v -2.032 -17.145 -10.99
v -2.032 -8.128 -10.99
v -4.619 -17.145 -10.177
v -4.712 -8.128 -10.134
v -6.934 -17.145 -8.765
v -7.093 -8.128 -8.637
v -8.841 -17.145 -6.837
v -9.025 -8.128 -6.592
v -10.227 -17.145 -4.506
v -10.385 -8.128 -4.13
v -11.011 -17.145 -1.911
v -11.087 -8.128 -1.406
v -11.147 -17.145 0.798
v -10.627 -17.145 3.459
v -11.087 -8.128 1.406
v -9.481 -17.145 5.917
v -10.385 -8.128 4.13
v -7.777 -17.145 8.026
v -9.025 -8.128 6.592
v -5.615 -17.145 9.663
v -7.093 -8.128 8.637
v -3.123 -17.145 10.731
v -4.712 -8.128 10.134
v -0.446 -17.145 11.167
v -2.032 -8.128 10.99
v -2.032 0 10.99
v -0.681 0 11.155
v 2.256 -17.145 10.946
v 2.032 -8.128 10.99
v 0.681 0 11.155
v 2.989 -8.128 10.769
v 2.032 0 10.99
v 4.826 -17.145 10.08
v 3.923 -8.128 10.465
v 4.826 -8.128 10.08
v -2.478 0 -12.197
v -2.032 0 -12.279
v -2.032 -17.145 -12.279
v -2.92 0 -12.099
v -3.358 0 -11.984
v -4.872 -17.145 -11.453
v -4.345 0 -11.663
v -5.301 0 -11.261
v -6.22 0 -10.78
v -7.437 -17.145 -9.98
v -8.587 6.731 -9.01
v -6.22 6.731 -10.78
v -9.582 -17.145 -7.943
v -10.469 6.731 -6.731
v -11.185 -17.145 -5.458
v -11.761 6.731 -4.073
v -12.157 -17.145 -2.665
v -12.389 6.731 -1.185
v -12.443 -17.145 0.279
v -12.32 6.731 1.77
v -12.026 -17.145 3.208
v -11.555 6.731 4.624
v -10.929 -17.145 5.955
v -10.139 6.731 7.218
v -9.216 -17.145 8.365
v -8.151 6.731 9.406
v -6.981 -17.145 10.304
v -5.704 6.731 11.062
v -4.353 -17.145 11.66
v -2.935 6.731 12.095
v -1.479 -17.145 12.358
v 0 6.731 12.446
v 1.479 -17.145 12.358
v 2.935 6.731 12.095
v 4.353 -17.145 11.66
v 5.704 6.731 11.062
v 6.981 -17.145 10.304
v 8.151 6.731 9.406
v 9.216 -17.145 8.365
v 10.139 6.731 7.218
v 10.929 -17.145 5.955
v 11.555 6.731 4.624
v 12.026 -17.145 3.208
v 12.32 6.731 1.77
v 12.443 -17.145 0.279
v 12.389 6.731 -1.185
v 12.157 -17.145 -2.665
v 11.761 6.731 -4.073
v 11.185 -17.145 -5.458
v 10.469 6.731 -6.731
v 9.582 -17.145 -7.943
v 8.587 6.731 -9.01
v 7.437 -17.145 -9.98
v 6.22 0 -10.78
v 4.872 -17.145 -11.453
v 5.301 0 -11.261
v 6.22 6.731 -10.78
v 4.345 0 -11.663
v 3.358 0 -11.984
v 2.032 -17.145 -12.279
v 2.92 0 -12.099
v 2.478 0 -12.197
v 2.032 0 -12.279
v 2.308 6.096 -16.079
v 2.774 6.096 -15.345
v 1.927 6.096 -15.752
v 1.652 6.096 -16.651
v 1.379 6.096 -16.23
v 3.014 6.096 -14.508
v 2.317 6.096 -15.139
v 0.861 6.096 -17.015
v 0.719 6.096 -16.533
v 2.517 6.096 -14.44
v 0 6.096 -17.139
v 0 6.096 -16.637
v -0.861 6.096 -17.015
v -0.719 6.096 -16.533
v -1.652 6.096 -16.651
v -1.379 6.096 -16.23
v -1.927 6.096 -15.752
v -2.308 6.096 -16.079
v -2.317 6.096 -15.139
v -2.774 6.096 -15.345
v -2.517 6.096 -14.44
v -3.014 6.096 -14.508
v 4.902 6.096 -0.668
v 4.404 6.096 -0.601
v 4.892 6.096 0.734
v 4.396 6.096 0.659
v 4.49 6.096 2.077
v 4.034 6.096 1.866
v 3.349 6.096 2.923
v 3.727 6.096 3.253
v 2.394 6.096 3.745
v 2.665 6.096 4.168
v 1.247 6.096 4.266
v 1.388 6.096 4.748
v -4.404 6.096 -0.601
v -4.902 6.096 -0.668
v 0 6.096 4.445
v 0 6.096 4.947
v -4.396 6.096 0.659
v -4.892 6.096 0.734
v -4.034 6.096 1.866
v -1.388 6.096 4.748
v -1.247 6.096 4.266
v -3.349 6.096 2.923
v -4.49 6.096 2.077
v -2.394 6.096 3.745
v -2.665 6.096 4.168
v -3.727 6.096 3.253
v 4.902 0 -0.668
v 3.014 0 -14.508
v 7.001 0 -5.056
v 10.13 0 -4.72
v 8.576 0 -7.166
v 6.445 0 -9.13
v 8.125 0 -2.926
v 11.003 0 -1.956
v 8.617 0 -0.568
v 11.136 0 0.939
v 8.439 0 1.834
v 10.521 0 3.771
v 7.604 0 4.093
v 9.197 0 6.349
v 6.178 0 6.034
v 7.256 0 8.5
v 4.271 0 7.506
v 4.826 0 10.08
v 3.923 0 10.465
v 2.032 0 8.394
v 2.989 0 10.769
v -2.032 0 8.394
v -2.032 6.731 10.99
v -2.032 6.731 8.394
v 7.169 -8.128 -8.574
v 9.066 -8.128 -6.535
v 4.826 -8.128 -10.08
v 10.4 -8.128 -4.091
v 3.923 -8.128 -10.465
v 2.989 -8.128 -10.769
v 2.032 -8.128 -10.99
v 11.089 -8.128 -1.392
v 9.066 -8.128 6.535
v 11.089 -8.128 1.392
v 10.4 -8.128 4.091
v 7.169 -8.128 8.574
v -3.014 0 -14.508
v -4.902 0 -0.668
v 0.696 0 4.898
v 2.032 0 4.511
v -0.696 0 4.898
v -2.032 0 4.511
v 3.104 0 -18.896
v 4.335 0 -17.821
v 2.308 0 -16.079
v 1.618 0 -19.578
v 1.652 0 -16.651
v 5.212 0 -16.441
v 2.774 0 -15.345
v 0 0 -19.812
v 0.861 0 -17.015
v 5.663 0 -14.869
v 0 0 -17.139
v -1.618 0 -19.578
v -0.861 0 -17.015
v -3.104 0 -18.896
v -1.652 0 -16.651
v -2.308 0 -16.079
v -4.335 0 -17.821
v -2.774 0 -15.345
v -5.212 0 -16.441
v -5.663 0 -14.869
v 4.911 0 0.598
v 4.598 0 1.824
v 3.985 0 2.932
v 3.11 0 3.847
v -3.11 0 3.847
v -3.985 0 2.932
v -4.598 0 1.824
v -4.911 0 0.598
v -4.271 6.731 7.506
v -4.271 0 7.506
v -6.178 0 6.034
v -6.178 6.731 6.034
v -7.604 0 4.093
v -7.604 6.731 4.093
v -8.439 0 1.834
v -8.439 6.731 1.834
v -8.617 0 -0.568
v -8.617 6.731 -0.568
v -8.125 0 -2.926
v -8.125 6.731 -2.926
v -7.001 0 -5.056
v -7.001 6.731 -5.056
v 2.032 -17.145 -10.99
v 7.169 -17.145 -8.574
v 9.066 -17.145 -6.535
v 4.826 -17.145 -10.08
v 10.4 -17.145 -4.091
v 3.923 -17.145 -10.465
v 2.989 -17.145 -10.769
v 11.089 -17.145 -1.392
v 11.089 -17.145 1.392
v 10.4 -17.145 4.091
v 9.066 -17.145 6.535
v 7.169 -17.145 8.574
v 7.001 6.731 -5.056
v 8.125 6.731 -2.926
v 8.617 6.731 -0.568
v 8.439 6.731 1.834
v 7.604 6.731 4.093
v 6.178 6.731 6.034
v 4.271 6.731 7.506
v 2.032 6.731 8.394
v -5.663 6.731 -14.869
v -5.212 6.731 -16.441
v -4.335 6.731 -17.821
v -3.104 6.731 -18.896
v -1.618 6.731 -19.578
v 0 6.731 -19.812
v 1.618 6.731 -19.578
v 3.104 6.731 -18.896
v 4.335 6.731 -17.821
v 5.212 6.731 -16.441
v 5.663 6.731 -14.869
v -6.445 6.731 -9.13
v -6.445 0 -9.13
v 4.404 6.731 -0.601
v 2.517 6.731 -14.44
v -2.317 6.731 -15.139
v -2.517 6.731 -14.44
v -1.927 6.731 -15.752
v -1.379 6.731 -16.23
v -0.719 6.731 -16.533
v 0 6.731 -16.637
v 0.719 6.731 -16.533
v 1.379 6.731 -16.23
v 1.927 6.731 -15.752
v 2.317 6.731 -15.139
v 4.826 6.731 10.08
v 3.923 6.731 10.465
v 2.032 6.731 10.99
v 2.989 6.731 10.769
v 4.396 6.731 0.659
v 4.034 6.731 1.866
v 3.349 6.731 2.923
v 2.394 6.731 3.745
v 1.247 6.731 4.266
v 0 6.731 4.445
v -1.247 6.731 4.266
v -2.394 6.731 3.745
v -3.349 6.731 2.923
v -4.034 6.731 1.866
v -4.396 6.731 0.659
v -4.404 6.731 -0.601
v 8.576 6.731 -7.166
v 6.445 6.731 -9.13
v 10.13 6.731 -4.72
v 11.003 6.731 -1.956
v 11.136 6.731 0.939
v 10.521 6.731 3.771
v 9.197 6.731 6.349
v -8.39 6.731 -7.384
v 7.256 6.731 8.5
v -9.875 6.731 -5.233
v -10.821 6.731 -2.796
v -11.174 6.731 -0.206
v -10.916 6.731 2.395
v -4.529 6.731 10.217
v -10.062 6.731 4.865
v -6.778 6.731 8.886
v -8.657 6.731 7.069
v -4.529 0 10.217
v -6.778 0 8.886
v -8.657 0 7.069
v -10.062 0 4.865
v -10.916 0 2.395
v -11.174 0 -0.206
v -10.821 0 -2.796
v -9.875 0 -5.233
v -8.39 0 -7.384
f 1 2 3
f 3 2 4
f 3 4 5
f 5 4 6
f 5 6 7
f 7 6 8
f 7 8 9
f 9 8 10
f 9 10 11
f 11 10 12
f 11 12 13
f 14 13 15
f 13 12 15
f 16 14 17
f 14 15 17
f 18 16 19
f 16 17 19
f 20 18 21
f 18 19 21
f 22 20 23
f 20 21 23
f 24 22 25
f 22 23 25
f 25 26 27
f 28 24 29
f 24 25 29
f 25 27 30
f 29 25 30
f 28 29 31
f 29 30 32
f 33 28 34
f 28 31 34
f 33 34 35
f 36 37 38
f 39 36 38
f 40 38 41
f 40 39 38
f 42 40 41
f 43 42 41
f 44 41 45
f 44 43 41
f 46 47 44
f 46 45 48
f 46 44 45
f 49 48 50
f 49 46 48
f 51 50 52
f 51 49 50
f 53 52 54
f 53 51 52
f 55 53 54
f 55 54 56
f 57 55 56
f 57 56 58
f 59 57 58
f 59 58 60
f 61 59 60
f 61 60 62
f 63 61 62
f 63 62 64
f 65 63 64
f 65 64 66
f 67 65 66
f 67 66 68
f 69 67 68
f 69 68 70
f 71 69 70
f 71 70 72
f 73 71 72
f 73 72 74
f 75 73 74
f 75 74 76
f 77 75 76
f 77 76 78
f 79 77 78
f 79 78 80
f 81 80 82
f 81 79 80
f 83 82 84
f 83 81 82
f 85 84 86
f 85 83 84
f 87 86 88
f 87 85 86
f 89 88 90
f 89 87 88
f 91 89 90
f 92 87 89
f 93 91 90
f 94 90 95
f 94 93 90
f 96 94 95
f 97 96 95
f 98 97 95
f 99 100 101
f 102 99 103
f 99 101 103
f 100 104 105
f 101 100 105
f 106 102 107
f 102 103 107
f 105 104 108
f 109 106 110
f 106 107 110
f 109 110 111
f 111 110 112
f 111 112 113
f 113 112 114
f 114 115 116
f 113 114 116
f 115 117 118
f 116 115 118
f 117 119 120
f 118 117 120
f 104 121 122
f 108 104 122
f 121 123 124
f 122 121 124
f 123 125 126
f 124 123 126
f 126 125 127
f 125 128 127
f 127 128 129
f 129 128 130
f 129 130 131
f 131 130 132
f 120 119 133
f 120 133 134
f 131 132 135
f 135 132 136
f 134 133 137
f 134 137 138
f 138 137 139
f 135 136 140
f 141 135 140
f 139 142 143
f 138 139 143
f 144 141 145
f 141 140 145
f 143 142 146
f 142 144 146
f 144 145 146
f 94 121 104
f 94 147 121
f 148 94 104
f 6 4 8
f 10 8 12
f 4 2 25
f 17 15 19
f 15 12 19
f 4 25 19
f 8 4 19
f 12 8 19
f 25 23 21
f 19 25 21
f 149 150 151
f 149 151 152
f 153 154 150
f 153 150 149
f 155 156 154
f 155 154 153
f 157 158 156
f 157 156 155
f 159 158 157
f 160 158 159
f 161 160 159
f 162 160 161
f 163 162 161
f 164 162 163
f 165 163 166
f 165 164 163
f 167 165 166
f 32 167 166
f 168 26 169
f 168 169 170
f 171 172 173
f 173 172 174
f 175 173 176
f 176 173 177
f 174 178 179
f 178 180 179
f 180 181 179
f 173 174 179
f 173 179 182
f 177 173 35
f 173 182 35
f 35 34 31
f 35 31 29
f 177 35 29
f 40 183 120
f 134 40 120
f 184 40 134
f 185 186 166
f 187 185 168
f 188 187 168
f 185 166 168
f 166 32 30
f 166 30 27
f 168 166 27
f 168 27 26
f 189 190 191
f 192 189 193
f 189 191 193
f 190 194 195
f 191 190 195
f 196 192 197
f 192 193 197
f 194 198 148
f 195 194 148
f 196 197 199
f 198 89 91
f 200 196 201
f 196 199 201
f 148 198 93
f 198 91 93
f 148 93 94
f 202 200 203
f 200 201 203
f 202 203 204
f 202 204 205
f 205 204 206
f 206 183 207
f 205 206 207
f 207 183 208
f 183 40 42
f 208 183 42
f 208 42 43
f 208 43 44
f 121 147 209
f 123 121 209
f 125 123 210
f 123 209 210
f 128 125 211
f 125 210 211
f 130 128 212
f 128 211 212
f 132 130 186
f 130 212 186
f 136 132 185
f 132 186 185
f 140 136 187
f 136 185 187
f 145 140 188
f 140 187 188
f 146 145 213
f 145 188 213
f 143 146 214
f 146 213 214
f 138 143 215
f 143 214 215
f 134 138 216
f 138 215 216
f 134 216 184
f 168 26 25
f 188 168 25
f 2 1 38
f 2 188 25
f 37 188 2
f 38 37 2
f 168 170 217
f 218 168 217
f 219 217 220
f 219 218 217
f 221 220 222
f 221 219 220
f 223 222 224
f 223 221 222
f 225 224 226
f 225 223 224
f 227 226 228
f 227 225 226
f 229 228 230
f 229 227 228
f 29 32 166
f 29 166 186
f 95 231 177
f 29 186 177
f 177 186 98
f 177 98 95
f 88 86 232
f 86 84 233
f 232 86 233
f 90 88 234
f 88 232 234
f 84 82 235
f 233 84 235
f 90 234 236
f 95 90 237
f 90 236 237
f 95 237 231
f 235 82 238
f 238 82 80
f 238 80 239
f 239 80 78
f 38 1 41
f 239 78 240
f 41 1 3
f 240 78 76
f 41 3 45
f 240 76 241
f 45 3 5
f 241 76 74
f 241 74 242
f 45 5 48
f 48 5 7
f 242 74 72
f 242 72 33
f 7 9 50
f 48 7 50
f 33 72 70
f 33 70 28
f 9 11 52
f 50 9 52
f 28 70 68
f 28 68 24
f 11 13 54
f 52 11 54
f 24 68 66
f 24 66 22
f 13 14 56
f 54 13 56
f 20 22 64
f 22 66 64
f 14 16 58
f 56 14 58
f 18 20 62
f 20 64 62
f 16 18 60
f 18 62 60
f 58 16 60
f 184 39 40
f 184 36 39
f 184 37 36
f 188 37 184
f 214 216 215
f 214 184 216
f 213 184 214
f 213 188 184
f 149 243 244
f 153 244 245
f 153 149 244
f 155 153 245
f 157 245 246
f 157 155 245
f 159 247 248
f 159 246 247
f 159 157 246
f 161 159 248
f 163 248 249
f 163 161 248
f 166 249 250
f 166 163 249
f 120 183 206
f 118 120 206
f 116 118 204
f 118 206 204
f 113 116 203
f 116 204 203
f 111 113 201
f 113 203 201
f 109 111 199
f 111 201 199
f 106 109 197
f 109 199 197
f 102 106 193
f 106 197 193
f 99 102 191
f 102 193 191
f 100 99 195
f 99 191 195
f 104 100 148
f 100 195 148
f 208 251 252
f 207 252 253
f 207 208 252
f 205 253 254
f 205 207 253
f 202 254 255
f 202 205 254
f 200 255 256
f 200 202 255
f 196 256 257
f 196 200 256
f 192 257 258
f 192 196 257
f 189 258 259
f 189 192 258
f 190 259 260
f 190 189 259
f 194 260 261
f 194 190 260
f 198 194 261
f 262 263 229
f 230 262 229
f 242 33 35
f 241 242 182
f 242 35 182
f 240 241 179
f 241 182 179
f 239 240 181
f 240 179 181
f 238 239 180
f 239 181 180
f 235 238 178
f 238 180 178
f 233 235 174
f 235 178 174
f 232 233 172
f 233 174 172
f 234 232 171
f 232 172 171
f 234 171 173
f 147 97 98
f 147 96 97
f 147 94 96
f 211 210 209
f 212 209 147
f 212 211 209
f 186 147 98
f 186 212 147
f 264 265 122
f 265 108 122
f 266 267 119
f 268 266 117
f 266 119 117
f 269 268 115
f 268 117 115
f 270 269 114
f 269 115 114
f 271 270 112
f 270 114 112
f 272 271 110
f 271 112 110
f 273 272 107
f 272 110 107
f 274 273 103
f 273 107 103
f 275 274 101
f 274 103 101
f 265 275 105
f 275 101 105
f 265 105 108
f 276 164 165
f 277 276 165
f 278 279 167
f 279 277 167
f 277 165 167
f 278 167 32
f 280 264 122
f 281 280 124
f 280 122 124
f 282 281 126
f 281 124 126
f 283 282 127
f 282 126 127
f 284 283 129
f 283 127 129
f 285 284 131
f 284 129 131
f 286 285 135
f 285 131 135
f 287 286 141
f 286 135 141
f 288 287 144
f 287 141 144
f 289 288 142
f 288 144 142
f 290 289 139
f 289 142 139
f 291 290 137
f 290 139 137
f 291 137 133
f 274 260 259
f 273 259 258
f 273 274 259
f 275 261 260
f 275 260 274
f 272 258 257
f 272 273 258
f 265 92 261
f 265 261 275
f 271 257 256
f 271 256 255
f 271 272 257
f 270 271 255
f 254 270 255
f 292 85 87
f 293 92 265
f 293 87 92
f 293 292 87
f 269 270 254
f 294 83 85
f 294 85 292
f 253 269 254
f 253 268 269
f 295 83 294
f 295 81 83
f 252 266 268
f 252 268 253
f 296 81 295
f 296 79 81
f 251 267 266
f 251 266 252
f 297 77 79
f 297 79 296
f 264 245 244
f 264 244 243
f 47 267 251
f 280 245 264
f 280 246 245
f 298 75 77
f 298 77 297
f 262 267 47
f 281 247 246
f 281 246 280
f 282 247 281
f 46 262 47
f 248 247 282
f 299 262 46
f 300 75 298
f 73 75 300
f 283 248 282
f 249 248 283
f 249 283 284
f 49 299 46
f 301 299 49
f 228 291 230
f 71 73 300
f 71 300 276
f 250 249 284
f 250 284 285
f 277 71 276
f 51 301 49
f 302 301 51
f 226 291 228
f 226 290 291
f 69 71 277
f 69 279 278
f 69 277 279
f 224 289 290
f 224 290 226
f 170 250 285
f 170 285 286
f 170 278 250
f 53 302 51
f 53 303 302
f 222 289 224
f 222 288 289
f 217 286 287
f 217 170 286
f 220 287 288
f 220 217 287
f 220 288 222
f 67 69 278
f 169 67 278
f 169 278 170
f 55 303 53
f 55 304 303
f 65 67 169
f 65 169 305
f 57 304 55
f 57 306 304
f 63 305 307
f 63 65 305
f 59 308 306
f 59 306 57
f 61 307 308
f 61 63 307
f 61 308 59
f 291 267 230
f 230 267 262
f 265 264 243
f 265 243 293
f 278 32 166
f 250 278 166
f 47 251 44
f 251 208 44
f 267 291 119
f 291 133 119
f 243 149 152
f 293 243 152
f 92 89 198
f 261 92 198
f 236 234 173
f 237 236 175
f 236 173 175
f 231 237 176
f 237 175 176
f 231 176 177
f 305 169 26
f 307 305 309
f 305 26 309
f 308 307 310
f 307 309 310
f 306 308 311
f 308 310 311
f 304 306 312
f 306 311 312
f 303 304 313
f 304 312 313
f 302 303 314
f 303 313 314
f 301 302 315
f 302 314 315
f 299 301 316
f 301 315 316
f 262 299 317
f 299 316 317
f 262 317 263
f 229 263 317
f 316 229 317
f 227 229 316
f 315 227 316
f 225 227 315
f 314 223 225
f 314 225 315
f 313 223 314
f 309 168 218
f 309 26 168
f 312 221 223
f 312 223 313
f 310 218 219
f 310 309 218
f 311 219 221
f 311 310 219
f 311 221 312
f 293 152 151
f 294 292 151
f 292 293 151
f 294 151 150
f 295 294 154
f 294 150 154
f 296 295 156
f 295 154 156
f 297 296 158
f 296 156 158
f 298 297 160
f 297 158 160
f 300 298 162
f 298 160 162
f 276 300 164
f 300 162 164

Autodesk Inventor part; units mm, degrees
ref_plane "YZ Plane" through (0, 0, 0) normal (1, 0, 0) x (0, 1, 0)
ref_plane "XZ Plane" through (0, 0, 0) normal (0, 1, 0) x (-1, 0, 0)
ref_plane "XY Plane" through (0, 0, 0) normal (0, 0, 1) x (1, 0, 0)
sketch "Block1" plane through (0, 0, 0) normal (0, 0, 1) x (1, 0, 0)
  arc A0 (4.4042, -0.6007) -> (-4.4042, -0.6007) centre (0, 0) ccw
  arc A1 (-2.5167, -14.4402) -> (2.5167, -14.4402) centre (0, -14.097) ccw
  line L0 (-2.5167, -14.4402) -> (-4.4042, -0.6007)
  line L1 (4.4042, -0.6007) -> (2.5167, -14.4402)
  line L2 (-7.5501, -1.0297) -> (-5.6626, -14.8693)
  arc A2 (-5.6626, -14.8693) -> (5.6626, -14.8693) centre (0, -14.097) ccw
  line L3 (5.6626, -14.8693) -> (7.5501, -1.0297)
  arc A3 (7.5501, -1.0297) -> (-7.5501, -1.0297) centre (0, 0) ccw
  line L4 (-4.9018, -0.6685) -> (-3.0142, -14.5081)
  arc A4 (-3.0142, -14.5081) -> (3.0142, -14.5081) centre (0, -14.097) ccw
  line L5 (3.0142, -14.5081) -> (4.9018, -0.6685)
  arc A5 (4.9018, -0.6685) -> (-4.9018, -0.6685) centre (0, 0) ccw
  point P0 (0, -7.4025)
  dimension "d127" = 8.89
  dimension "d131" = 5.08
  dimension "d140" = 3.175
sketch "Sketch10" plane through (0, 0, 0) normal (0, 1, 0) x (-1, 0, 0)
  circle A0 centre (0, 0) radius 8.636
  line L0 (0, -14.097) -> (0, 0)
  arc A1 (-4.826, 10.0803) -> (-4.826, -10.0803) centre (0, 0) ccw
  circle A2 centre (0, 0) radius 11.176
  circle A3 centre (0, 0) radius 12.446
  line L1 (-12.7635, 23.7871) -> (12.7635, 23.7871)
  line L2 (0, 23.7871) -> (0, -23.7871)
  line L3 (-12.7635, -23.7871) -> (12.7635, -23.7871)
  line L4 (-2.032, 23.7871) -> (-2.032, -23.7871)
  line L5 (2.032, 23.7871) -> (2.032, -23.7871)
  line L6 (0, 11.176) -> (0, -22.606)
  line L7 (0, 11.176) -> (0, -22.606)
  arc A4 (4.4042, -0.6007) -> (-4.4042, -0.6007) centre (0, 0) ccw
  arc A5 (-2.5167, -14.4402) -> (2.5167, -14.4402) centre (0, -14.097) ccw
  line L8 (-2.5167, -14.4402) -> (-4.4042, -0.6007)
  line L9 (4.4042, -0.6007) -> (2.5167, -14.4402)
  line L10 (-7.5501, -1.0297) -> (-5.6626, -14.8693)
  arc A6 (-5.6626, -14.8693) -> (5.6626, -14.8693) centre (0, -14.097) ccw
  line L11 (5.6626, -14.8693) -> (7.5501, -1.0297)
  arc A7 (7.5501, -1.0297) -> (-7.5501, -1.0297) centre (0, 0) ccw
  line L12 (-4.9018, -0.6685) -> (-3.0142, -14.5081)
  arc A8 (-3.0142, -14.5081) -> (3.0142, -14.5081) centre (0, -14.097) ccw
  line L13 (3.0142, -14.5081) -> (4.9018, -0.6685)
  arc A9 (4.9018, -0.6685) -> (-4.9018, -0.6685) centre (0, 0) ccw
  point P0 (2.032, -10.9897)
  point P1 (2.032, -12.279)
  point P2 (-2.032, -12.279)
  point P3 (-2.032, -10.9897)
  point P4 (-2.032, 10.9897)
  point P5 (2.032, 10.9897)
  point P6 (-6.1771, -11.0965)
  point P7 (6.1771, -11.0965)
  point P8 (6.4453, -9.1302)
  point P9 (7.0009, -5.0565)
  point P10 (2.032, 8.3935)
  point P11 (-2.032, 8.3935)
  point P12 (-7.0009, -5.0565)
  point P13 (-6.4453, -9.1302)
  point P14 (6.1771, -11.0965)
  point P15 (-6.1771, -11.0965)
  point P16 (2.032, 7.3441)
  point P17 (-7.0009, -5.0565)
  point P18 (7.0009, -5.0565)
  point P19 (6.4453, -9.1302)
  point P20 (2.032, -19.4386)
  point P21 (-6.4453, -9.1302)
  point P22 (2.032, -8.3935)
  point P23 (-2.032, 7.3441)
  point P24 (-2.032, -19.4386)
  point P25 (-2.032, -8.3935)
  point P26 (6.2203, -10.7801)
  point P27 (-6.2203, -10.7801)
  point P28 (2.032, 7.3441)
  point P29 (-7.0009, -5.0565)
  point P30 (7.0009, -5.0565)
  point P31 (6.4453, -9.1302)
  point P32 (2.032, -19.4386)
  point P33 (-6.4453, -9.1302)
  point P34 (-2.032, 7.3441)
  point P35 (-2.032, -19.4386)
  point P36 (-6.4453, -9.1302)
  dimension "d149" = 24.892
  dimension "d148" = 2.032
  dimension "d147" = 2.032
  dimension "d146" = 33.782
  dimension "d159" = 33.782
extrude "Extrusion21" add sketch "Sketch10" against normal blind 17.145 contours L5 A3 L11 A2 | A2 L2 A3 L5 | L11 A3 L13 A2 | A2 L4 A3 L2 | L13 A3 L9 A2 | A2 A1 L10 A3 L4 | L9 A3 L5 A2 | A1 A2 L12 A3 L10 | A2 L8 A3 L12 | A2 L4 A3 L8
extrude "Extrusion22" add sketch "Sketch10" against normal blind 8.128 contours A0 L11 A7 L5 | A0 L5 A2 L11 | L11 A2 L13 A0 | A0 L13 A9 L5 A7 L11 | L13 A2 L9 A0 | A0 L9 A4 L5 A9 L13 | L4 A7 L10 A0 | A0 L10 A1 A2 L4 | L9 A2 L5 A0 | A0 L5 A4 L9 | L10 A7 L4 A9 L12 A0 | A0 L12 A2 A1 L10 | L12 A9 L4 A4 L8 A0 | A0 L8 A2 L12 | L8 A4 L4 A0 | A0 L4 A2 L8
extrude "Extrusion23" add sketch "Sketch10" along normal blind 6.731 contours A0 L11 A7 L5 | L5 A7 L2 A0 | A0 L2 A2 L5 | L11 A2 L13 A0 | A0 L13 A9 L5 A7 L11 | L2 A7 L4 A0 | A0 L4 A2 L2 | L5 A3 L11 A2 | A2 L2 A3 L5 | L5 A9 L2 A7 | L13 A2 L9 A0 | A0 L9 A4 L5 A9 L13 | L11 A3 L13 A2 | L4 A7 L10 A0 | A2 L4 A3 L2 | L2 A9 L4 A7 | L5 A4 L2 A9 | L13 A3 L9 A2 | L11 A6 L5 A8 L13 A3 | L10 A7 L4 A9 L12 A0 | A0 L12 A2 A1 L10 | A2 A1 L10 A3 L4 | L2 A4 L4 A9 | L13 A8 L5 A5 L9 A3 | L12 A9 L4 A4 L8 A0 | A0 L8 A2 L12 | A1 A2 L12 A3 L10 | A6 L2 A8 L5 | A2 L8 A3 L12 | A3 L12 A8 L4 A6 L10 | A8 L2 A5 L5 | A6 L4 A8 L2 | A3 L8 A5 L4 A8 L12 | A8 L4 A5 L2
extrude "Extrusion24" cut sketch "Sketch10" along normal blind 6.096 contours L13 A2 L9 A0 | A0 L9 A4 L5 A9 L13 | L5 A4 L2 A9 | L9 A2 L5 A0 | A0 L5 A4 L9 | L13 A3 L9 A2 | L2 A4 L4 A9 | L5 A0 L0 L2 A4 | L5 A2 L0 A0 | L9 A3 L5 A2 | L13 A8 L5 A5 L9 A3 | L12 A9 L4 A4 L8 A0 | A0 L8 A2 L12 | L2 L0 A0 L4 A4 | L0 A2 L4 A0 | L5 A3 L0 A2 | L9 A5 L5 A3 | L8 A4 L4 A0 | A0 L4 A2 L8 | A2 L8 A3 L12 | L0 A3 L4 A2 | L5 A5 L2 L0 A3 | A8 L2 A5 L5 | A2 L4 A3 L8 | A3 L8 A5 L4 A8 L12 | L0 L2 A5 L4 A3 | A8 L4 A5 L2 | A3 L4 A5 L8
properties part number "Servo Adapter 4"
